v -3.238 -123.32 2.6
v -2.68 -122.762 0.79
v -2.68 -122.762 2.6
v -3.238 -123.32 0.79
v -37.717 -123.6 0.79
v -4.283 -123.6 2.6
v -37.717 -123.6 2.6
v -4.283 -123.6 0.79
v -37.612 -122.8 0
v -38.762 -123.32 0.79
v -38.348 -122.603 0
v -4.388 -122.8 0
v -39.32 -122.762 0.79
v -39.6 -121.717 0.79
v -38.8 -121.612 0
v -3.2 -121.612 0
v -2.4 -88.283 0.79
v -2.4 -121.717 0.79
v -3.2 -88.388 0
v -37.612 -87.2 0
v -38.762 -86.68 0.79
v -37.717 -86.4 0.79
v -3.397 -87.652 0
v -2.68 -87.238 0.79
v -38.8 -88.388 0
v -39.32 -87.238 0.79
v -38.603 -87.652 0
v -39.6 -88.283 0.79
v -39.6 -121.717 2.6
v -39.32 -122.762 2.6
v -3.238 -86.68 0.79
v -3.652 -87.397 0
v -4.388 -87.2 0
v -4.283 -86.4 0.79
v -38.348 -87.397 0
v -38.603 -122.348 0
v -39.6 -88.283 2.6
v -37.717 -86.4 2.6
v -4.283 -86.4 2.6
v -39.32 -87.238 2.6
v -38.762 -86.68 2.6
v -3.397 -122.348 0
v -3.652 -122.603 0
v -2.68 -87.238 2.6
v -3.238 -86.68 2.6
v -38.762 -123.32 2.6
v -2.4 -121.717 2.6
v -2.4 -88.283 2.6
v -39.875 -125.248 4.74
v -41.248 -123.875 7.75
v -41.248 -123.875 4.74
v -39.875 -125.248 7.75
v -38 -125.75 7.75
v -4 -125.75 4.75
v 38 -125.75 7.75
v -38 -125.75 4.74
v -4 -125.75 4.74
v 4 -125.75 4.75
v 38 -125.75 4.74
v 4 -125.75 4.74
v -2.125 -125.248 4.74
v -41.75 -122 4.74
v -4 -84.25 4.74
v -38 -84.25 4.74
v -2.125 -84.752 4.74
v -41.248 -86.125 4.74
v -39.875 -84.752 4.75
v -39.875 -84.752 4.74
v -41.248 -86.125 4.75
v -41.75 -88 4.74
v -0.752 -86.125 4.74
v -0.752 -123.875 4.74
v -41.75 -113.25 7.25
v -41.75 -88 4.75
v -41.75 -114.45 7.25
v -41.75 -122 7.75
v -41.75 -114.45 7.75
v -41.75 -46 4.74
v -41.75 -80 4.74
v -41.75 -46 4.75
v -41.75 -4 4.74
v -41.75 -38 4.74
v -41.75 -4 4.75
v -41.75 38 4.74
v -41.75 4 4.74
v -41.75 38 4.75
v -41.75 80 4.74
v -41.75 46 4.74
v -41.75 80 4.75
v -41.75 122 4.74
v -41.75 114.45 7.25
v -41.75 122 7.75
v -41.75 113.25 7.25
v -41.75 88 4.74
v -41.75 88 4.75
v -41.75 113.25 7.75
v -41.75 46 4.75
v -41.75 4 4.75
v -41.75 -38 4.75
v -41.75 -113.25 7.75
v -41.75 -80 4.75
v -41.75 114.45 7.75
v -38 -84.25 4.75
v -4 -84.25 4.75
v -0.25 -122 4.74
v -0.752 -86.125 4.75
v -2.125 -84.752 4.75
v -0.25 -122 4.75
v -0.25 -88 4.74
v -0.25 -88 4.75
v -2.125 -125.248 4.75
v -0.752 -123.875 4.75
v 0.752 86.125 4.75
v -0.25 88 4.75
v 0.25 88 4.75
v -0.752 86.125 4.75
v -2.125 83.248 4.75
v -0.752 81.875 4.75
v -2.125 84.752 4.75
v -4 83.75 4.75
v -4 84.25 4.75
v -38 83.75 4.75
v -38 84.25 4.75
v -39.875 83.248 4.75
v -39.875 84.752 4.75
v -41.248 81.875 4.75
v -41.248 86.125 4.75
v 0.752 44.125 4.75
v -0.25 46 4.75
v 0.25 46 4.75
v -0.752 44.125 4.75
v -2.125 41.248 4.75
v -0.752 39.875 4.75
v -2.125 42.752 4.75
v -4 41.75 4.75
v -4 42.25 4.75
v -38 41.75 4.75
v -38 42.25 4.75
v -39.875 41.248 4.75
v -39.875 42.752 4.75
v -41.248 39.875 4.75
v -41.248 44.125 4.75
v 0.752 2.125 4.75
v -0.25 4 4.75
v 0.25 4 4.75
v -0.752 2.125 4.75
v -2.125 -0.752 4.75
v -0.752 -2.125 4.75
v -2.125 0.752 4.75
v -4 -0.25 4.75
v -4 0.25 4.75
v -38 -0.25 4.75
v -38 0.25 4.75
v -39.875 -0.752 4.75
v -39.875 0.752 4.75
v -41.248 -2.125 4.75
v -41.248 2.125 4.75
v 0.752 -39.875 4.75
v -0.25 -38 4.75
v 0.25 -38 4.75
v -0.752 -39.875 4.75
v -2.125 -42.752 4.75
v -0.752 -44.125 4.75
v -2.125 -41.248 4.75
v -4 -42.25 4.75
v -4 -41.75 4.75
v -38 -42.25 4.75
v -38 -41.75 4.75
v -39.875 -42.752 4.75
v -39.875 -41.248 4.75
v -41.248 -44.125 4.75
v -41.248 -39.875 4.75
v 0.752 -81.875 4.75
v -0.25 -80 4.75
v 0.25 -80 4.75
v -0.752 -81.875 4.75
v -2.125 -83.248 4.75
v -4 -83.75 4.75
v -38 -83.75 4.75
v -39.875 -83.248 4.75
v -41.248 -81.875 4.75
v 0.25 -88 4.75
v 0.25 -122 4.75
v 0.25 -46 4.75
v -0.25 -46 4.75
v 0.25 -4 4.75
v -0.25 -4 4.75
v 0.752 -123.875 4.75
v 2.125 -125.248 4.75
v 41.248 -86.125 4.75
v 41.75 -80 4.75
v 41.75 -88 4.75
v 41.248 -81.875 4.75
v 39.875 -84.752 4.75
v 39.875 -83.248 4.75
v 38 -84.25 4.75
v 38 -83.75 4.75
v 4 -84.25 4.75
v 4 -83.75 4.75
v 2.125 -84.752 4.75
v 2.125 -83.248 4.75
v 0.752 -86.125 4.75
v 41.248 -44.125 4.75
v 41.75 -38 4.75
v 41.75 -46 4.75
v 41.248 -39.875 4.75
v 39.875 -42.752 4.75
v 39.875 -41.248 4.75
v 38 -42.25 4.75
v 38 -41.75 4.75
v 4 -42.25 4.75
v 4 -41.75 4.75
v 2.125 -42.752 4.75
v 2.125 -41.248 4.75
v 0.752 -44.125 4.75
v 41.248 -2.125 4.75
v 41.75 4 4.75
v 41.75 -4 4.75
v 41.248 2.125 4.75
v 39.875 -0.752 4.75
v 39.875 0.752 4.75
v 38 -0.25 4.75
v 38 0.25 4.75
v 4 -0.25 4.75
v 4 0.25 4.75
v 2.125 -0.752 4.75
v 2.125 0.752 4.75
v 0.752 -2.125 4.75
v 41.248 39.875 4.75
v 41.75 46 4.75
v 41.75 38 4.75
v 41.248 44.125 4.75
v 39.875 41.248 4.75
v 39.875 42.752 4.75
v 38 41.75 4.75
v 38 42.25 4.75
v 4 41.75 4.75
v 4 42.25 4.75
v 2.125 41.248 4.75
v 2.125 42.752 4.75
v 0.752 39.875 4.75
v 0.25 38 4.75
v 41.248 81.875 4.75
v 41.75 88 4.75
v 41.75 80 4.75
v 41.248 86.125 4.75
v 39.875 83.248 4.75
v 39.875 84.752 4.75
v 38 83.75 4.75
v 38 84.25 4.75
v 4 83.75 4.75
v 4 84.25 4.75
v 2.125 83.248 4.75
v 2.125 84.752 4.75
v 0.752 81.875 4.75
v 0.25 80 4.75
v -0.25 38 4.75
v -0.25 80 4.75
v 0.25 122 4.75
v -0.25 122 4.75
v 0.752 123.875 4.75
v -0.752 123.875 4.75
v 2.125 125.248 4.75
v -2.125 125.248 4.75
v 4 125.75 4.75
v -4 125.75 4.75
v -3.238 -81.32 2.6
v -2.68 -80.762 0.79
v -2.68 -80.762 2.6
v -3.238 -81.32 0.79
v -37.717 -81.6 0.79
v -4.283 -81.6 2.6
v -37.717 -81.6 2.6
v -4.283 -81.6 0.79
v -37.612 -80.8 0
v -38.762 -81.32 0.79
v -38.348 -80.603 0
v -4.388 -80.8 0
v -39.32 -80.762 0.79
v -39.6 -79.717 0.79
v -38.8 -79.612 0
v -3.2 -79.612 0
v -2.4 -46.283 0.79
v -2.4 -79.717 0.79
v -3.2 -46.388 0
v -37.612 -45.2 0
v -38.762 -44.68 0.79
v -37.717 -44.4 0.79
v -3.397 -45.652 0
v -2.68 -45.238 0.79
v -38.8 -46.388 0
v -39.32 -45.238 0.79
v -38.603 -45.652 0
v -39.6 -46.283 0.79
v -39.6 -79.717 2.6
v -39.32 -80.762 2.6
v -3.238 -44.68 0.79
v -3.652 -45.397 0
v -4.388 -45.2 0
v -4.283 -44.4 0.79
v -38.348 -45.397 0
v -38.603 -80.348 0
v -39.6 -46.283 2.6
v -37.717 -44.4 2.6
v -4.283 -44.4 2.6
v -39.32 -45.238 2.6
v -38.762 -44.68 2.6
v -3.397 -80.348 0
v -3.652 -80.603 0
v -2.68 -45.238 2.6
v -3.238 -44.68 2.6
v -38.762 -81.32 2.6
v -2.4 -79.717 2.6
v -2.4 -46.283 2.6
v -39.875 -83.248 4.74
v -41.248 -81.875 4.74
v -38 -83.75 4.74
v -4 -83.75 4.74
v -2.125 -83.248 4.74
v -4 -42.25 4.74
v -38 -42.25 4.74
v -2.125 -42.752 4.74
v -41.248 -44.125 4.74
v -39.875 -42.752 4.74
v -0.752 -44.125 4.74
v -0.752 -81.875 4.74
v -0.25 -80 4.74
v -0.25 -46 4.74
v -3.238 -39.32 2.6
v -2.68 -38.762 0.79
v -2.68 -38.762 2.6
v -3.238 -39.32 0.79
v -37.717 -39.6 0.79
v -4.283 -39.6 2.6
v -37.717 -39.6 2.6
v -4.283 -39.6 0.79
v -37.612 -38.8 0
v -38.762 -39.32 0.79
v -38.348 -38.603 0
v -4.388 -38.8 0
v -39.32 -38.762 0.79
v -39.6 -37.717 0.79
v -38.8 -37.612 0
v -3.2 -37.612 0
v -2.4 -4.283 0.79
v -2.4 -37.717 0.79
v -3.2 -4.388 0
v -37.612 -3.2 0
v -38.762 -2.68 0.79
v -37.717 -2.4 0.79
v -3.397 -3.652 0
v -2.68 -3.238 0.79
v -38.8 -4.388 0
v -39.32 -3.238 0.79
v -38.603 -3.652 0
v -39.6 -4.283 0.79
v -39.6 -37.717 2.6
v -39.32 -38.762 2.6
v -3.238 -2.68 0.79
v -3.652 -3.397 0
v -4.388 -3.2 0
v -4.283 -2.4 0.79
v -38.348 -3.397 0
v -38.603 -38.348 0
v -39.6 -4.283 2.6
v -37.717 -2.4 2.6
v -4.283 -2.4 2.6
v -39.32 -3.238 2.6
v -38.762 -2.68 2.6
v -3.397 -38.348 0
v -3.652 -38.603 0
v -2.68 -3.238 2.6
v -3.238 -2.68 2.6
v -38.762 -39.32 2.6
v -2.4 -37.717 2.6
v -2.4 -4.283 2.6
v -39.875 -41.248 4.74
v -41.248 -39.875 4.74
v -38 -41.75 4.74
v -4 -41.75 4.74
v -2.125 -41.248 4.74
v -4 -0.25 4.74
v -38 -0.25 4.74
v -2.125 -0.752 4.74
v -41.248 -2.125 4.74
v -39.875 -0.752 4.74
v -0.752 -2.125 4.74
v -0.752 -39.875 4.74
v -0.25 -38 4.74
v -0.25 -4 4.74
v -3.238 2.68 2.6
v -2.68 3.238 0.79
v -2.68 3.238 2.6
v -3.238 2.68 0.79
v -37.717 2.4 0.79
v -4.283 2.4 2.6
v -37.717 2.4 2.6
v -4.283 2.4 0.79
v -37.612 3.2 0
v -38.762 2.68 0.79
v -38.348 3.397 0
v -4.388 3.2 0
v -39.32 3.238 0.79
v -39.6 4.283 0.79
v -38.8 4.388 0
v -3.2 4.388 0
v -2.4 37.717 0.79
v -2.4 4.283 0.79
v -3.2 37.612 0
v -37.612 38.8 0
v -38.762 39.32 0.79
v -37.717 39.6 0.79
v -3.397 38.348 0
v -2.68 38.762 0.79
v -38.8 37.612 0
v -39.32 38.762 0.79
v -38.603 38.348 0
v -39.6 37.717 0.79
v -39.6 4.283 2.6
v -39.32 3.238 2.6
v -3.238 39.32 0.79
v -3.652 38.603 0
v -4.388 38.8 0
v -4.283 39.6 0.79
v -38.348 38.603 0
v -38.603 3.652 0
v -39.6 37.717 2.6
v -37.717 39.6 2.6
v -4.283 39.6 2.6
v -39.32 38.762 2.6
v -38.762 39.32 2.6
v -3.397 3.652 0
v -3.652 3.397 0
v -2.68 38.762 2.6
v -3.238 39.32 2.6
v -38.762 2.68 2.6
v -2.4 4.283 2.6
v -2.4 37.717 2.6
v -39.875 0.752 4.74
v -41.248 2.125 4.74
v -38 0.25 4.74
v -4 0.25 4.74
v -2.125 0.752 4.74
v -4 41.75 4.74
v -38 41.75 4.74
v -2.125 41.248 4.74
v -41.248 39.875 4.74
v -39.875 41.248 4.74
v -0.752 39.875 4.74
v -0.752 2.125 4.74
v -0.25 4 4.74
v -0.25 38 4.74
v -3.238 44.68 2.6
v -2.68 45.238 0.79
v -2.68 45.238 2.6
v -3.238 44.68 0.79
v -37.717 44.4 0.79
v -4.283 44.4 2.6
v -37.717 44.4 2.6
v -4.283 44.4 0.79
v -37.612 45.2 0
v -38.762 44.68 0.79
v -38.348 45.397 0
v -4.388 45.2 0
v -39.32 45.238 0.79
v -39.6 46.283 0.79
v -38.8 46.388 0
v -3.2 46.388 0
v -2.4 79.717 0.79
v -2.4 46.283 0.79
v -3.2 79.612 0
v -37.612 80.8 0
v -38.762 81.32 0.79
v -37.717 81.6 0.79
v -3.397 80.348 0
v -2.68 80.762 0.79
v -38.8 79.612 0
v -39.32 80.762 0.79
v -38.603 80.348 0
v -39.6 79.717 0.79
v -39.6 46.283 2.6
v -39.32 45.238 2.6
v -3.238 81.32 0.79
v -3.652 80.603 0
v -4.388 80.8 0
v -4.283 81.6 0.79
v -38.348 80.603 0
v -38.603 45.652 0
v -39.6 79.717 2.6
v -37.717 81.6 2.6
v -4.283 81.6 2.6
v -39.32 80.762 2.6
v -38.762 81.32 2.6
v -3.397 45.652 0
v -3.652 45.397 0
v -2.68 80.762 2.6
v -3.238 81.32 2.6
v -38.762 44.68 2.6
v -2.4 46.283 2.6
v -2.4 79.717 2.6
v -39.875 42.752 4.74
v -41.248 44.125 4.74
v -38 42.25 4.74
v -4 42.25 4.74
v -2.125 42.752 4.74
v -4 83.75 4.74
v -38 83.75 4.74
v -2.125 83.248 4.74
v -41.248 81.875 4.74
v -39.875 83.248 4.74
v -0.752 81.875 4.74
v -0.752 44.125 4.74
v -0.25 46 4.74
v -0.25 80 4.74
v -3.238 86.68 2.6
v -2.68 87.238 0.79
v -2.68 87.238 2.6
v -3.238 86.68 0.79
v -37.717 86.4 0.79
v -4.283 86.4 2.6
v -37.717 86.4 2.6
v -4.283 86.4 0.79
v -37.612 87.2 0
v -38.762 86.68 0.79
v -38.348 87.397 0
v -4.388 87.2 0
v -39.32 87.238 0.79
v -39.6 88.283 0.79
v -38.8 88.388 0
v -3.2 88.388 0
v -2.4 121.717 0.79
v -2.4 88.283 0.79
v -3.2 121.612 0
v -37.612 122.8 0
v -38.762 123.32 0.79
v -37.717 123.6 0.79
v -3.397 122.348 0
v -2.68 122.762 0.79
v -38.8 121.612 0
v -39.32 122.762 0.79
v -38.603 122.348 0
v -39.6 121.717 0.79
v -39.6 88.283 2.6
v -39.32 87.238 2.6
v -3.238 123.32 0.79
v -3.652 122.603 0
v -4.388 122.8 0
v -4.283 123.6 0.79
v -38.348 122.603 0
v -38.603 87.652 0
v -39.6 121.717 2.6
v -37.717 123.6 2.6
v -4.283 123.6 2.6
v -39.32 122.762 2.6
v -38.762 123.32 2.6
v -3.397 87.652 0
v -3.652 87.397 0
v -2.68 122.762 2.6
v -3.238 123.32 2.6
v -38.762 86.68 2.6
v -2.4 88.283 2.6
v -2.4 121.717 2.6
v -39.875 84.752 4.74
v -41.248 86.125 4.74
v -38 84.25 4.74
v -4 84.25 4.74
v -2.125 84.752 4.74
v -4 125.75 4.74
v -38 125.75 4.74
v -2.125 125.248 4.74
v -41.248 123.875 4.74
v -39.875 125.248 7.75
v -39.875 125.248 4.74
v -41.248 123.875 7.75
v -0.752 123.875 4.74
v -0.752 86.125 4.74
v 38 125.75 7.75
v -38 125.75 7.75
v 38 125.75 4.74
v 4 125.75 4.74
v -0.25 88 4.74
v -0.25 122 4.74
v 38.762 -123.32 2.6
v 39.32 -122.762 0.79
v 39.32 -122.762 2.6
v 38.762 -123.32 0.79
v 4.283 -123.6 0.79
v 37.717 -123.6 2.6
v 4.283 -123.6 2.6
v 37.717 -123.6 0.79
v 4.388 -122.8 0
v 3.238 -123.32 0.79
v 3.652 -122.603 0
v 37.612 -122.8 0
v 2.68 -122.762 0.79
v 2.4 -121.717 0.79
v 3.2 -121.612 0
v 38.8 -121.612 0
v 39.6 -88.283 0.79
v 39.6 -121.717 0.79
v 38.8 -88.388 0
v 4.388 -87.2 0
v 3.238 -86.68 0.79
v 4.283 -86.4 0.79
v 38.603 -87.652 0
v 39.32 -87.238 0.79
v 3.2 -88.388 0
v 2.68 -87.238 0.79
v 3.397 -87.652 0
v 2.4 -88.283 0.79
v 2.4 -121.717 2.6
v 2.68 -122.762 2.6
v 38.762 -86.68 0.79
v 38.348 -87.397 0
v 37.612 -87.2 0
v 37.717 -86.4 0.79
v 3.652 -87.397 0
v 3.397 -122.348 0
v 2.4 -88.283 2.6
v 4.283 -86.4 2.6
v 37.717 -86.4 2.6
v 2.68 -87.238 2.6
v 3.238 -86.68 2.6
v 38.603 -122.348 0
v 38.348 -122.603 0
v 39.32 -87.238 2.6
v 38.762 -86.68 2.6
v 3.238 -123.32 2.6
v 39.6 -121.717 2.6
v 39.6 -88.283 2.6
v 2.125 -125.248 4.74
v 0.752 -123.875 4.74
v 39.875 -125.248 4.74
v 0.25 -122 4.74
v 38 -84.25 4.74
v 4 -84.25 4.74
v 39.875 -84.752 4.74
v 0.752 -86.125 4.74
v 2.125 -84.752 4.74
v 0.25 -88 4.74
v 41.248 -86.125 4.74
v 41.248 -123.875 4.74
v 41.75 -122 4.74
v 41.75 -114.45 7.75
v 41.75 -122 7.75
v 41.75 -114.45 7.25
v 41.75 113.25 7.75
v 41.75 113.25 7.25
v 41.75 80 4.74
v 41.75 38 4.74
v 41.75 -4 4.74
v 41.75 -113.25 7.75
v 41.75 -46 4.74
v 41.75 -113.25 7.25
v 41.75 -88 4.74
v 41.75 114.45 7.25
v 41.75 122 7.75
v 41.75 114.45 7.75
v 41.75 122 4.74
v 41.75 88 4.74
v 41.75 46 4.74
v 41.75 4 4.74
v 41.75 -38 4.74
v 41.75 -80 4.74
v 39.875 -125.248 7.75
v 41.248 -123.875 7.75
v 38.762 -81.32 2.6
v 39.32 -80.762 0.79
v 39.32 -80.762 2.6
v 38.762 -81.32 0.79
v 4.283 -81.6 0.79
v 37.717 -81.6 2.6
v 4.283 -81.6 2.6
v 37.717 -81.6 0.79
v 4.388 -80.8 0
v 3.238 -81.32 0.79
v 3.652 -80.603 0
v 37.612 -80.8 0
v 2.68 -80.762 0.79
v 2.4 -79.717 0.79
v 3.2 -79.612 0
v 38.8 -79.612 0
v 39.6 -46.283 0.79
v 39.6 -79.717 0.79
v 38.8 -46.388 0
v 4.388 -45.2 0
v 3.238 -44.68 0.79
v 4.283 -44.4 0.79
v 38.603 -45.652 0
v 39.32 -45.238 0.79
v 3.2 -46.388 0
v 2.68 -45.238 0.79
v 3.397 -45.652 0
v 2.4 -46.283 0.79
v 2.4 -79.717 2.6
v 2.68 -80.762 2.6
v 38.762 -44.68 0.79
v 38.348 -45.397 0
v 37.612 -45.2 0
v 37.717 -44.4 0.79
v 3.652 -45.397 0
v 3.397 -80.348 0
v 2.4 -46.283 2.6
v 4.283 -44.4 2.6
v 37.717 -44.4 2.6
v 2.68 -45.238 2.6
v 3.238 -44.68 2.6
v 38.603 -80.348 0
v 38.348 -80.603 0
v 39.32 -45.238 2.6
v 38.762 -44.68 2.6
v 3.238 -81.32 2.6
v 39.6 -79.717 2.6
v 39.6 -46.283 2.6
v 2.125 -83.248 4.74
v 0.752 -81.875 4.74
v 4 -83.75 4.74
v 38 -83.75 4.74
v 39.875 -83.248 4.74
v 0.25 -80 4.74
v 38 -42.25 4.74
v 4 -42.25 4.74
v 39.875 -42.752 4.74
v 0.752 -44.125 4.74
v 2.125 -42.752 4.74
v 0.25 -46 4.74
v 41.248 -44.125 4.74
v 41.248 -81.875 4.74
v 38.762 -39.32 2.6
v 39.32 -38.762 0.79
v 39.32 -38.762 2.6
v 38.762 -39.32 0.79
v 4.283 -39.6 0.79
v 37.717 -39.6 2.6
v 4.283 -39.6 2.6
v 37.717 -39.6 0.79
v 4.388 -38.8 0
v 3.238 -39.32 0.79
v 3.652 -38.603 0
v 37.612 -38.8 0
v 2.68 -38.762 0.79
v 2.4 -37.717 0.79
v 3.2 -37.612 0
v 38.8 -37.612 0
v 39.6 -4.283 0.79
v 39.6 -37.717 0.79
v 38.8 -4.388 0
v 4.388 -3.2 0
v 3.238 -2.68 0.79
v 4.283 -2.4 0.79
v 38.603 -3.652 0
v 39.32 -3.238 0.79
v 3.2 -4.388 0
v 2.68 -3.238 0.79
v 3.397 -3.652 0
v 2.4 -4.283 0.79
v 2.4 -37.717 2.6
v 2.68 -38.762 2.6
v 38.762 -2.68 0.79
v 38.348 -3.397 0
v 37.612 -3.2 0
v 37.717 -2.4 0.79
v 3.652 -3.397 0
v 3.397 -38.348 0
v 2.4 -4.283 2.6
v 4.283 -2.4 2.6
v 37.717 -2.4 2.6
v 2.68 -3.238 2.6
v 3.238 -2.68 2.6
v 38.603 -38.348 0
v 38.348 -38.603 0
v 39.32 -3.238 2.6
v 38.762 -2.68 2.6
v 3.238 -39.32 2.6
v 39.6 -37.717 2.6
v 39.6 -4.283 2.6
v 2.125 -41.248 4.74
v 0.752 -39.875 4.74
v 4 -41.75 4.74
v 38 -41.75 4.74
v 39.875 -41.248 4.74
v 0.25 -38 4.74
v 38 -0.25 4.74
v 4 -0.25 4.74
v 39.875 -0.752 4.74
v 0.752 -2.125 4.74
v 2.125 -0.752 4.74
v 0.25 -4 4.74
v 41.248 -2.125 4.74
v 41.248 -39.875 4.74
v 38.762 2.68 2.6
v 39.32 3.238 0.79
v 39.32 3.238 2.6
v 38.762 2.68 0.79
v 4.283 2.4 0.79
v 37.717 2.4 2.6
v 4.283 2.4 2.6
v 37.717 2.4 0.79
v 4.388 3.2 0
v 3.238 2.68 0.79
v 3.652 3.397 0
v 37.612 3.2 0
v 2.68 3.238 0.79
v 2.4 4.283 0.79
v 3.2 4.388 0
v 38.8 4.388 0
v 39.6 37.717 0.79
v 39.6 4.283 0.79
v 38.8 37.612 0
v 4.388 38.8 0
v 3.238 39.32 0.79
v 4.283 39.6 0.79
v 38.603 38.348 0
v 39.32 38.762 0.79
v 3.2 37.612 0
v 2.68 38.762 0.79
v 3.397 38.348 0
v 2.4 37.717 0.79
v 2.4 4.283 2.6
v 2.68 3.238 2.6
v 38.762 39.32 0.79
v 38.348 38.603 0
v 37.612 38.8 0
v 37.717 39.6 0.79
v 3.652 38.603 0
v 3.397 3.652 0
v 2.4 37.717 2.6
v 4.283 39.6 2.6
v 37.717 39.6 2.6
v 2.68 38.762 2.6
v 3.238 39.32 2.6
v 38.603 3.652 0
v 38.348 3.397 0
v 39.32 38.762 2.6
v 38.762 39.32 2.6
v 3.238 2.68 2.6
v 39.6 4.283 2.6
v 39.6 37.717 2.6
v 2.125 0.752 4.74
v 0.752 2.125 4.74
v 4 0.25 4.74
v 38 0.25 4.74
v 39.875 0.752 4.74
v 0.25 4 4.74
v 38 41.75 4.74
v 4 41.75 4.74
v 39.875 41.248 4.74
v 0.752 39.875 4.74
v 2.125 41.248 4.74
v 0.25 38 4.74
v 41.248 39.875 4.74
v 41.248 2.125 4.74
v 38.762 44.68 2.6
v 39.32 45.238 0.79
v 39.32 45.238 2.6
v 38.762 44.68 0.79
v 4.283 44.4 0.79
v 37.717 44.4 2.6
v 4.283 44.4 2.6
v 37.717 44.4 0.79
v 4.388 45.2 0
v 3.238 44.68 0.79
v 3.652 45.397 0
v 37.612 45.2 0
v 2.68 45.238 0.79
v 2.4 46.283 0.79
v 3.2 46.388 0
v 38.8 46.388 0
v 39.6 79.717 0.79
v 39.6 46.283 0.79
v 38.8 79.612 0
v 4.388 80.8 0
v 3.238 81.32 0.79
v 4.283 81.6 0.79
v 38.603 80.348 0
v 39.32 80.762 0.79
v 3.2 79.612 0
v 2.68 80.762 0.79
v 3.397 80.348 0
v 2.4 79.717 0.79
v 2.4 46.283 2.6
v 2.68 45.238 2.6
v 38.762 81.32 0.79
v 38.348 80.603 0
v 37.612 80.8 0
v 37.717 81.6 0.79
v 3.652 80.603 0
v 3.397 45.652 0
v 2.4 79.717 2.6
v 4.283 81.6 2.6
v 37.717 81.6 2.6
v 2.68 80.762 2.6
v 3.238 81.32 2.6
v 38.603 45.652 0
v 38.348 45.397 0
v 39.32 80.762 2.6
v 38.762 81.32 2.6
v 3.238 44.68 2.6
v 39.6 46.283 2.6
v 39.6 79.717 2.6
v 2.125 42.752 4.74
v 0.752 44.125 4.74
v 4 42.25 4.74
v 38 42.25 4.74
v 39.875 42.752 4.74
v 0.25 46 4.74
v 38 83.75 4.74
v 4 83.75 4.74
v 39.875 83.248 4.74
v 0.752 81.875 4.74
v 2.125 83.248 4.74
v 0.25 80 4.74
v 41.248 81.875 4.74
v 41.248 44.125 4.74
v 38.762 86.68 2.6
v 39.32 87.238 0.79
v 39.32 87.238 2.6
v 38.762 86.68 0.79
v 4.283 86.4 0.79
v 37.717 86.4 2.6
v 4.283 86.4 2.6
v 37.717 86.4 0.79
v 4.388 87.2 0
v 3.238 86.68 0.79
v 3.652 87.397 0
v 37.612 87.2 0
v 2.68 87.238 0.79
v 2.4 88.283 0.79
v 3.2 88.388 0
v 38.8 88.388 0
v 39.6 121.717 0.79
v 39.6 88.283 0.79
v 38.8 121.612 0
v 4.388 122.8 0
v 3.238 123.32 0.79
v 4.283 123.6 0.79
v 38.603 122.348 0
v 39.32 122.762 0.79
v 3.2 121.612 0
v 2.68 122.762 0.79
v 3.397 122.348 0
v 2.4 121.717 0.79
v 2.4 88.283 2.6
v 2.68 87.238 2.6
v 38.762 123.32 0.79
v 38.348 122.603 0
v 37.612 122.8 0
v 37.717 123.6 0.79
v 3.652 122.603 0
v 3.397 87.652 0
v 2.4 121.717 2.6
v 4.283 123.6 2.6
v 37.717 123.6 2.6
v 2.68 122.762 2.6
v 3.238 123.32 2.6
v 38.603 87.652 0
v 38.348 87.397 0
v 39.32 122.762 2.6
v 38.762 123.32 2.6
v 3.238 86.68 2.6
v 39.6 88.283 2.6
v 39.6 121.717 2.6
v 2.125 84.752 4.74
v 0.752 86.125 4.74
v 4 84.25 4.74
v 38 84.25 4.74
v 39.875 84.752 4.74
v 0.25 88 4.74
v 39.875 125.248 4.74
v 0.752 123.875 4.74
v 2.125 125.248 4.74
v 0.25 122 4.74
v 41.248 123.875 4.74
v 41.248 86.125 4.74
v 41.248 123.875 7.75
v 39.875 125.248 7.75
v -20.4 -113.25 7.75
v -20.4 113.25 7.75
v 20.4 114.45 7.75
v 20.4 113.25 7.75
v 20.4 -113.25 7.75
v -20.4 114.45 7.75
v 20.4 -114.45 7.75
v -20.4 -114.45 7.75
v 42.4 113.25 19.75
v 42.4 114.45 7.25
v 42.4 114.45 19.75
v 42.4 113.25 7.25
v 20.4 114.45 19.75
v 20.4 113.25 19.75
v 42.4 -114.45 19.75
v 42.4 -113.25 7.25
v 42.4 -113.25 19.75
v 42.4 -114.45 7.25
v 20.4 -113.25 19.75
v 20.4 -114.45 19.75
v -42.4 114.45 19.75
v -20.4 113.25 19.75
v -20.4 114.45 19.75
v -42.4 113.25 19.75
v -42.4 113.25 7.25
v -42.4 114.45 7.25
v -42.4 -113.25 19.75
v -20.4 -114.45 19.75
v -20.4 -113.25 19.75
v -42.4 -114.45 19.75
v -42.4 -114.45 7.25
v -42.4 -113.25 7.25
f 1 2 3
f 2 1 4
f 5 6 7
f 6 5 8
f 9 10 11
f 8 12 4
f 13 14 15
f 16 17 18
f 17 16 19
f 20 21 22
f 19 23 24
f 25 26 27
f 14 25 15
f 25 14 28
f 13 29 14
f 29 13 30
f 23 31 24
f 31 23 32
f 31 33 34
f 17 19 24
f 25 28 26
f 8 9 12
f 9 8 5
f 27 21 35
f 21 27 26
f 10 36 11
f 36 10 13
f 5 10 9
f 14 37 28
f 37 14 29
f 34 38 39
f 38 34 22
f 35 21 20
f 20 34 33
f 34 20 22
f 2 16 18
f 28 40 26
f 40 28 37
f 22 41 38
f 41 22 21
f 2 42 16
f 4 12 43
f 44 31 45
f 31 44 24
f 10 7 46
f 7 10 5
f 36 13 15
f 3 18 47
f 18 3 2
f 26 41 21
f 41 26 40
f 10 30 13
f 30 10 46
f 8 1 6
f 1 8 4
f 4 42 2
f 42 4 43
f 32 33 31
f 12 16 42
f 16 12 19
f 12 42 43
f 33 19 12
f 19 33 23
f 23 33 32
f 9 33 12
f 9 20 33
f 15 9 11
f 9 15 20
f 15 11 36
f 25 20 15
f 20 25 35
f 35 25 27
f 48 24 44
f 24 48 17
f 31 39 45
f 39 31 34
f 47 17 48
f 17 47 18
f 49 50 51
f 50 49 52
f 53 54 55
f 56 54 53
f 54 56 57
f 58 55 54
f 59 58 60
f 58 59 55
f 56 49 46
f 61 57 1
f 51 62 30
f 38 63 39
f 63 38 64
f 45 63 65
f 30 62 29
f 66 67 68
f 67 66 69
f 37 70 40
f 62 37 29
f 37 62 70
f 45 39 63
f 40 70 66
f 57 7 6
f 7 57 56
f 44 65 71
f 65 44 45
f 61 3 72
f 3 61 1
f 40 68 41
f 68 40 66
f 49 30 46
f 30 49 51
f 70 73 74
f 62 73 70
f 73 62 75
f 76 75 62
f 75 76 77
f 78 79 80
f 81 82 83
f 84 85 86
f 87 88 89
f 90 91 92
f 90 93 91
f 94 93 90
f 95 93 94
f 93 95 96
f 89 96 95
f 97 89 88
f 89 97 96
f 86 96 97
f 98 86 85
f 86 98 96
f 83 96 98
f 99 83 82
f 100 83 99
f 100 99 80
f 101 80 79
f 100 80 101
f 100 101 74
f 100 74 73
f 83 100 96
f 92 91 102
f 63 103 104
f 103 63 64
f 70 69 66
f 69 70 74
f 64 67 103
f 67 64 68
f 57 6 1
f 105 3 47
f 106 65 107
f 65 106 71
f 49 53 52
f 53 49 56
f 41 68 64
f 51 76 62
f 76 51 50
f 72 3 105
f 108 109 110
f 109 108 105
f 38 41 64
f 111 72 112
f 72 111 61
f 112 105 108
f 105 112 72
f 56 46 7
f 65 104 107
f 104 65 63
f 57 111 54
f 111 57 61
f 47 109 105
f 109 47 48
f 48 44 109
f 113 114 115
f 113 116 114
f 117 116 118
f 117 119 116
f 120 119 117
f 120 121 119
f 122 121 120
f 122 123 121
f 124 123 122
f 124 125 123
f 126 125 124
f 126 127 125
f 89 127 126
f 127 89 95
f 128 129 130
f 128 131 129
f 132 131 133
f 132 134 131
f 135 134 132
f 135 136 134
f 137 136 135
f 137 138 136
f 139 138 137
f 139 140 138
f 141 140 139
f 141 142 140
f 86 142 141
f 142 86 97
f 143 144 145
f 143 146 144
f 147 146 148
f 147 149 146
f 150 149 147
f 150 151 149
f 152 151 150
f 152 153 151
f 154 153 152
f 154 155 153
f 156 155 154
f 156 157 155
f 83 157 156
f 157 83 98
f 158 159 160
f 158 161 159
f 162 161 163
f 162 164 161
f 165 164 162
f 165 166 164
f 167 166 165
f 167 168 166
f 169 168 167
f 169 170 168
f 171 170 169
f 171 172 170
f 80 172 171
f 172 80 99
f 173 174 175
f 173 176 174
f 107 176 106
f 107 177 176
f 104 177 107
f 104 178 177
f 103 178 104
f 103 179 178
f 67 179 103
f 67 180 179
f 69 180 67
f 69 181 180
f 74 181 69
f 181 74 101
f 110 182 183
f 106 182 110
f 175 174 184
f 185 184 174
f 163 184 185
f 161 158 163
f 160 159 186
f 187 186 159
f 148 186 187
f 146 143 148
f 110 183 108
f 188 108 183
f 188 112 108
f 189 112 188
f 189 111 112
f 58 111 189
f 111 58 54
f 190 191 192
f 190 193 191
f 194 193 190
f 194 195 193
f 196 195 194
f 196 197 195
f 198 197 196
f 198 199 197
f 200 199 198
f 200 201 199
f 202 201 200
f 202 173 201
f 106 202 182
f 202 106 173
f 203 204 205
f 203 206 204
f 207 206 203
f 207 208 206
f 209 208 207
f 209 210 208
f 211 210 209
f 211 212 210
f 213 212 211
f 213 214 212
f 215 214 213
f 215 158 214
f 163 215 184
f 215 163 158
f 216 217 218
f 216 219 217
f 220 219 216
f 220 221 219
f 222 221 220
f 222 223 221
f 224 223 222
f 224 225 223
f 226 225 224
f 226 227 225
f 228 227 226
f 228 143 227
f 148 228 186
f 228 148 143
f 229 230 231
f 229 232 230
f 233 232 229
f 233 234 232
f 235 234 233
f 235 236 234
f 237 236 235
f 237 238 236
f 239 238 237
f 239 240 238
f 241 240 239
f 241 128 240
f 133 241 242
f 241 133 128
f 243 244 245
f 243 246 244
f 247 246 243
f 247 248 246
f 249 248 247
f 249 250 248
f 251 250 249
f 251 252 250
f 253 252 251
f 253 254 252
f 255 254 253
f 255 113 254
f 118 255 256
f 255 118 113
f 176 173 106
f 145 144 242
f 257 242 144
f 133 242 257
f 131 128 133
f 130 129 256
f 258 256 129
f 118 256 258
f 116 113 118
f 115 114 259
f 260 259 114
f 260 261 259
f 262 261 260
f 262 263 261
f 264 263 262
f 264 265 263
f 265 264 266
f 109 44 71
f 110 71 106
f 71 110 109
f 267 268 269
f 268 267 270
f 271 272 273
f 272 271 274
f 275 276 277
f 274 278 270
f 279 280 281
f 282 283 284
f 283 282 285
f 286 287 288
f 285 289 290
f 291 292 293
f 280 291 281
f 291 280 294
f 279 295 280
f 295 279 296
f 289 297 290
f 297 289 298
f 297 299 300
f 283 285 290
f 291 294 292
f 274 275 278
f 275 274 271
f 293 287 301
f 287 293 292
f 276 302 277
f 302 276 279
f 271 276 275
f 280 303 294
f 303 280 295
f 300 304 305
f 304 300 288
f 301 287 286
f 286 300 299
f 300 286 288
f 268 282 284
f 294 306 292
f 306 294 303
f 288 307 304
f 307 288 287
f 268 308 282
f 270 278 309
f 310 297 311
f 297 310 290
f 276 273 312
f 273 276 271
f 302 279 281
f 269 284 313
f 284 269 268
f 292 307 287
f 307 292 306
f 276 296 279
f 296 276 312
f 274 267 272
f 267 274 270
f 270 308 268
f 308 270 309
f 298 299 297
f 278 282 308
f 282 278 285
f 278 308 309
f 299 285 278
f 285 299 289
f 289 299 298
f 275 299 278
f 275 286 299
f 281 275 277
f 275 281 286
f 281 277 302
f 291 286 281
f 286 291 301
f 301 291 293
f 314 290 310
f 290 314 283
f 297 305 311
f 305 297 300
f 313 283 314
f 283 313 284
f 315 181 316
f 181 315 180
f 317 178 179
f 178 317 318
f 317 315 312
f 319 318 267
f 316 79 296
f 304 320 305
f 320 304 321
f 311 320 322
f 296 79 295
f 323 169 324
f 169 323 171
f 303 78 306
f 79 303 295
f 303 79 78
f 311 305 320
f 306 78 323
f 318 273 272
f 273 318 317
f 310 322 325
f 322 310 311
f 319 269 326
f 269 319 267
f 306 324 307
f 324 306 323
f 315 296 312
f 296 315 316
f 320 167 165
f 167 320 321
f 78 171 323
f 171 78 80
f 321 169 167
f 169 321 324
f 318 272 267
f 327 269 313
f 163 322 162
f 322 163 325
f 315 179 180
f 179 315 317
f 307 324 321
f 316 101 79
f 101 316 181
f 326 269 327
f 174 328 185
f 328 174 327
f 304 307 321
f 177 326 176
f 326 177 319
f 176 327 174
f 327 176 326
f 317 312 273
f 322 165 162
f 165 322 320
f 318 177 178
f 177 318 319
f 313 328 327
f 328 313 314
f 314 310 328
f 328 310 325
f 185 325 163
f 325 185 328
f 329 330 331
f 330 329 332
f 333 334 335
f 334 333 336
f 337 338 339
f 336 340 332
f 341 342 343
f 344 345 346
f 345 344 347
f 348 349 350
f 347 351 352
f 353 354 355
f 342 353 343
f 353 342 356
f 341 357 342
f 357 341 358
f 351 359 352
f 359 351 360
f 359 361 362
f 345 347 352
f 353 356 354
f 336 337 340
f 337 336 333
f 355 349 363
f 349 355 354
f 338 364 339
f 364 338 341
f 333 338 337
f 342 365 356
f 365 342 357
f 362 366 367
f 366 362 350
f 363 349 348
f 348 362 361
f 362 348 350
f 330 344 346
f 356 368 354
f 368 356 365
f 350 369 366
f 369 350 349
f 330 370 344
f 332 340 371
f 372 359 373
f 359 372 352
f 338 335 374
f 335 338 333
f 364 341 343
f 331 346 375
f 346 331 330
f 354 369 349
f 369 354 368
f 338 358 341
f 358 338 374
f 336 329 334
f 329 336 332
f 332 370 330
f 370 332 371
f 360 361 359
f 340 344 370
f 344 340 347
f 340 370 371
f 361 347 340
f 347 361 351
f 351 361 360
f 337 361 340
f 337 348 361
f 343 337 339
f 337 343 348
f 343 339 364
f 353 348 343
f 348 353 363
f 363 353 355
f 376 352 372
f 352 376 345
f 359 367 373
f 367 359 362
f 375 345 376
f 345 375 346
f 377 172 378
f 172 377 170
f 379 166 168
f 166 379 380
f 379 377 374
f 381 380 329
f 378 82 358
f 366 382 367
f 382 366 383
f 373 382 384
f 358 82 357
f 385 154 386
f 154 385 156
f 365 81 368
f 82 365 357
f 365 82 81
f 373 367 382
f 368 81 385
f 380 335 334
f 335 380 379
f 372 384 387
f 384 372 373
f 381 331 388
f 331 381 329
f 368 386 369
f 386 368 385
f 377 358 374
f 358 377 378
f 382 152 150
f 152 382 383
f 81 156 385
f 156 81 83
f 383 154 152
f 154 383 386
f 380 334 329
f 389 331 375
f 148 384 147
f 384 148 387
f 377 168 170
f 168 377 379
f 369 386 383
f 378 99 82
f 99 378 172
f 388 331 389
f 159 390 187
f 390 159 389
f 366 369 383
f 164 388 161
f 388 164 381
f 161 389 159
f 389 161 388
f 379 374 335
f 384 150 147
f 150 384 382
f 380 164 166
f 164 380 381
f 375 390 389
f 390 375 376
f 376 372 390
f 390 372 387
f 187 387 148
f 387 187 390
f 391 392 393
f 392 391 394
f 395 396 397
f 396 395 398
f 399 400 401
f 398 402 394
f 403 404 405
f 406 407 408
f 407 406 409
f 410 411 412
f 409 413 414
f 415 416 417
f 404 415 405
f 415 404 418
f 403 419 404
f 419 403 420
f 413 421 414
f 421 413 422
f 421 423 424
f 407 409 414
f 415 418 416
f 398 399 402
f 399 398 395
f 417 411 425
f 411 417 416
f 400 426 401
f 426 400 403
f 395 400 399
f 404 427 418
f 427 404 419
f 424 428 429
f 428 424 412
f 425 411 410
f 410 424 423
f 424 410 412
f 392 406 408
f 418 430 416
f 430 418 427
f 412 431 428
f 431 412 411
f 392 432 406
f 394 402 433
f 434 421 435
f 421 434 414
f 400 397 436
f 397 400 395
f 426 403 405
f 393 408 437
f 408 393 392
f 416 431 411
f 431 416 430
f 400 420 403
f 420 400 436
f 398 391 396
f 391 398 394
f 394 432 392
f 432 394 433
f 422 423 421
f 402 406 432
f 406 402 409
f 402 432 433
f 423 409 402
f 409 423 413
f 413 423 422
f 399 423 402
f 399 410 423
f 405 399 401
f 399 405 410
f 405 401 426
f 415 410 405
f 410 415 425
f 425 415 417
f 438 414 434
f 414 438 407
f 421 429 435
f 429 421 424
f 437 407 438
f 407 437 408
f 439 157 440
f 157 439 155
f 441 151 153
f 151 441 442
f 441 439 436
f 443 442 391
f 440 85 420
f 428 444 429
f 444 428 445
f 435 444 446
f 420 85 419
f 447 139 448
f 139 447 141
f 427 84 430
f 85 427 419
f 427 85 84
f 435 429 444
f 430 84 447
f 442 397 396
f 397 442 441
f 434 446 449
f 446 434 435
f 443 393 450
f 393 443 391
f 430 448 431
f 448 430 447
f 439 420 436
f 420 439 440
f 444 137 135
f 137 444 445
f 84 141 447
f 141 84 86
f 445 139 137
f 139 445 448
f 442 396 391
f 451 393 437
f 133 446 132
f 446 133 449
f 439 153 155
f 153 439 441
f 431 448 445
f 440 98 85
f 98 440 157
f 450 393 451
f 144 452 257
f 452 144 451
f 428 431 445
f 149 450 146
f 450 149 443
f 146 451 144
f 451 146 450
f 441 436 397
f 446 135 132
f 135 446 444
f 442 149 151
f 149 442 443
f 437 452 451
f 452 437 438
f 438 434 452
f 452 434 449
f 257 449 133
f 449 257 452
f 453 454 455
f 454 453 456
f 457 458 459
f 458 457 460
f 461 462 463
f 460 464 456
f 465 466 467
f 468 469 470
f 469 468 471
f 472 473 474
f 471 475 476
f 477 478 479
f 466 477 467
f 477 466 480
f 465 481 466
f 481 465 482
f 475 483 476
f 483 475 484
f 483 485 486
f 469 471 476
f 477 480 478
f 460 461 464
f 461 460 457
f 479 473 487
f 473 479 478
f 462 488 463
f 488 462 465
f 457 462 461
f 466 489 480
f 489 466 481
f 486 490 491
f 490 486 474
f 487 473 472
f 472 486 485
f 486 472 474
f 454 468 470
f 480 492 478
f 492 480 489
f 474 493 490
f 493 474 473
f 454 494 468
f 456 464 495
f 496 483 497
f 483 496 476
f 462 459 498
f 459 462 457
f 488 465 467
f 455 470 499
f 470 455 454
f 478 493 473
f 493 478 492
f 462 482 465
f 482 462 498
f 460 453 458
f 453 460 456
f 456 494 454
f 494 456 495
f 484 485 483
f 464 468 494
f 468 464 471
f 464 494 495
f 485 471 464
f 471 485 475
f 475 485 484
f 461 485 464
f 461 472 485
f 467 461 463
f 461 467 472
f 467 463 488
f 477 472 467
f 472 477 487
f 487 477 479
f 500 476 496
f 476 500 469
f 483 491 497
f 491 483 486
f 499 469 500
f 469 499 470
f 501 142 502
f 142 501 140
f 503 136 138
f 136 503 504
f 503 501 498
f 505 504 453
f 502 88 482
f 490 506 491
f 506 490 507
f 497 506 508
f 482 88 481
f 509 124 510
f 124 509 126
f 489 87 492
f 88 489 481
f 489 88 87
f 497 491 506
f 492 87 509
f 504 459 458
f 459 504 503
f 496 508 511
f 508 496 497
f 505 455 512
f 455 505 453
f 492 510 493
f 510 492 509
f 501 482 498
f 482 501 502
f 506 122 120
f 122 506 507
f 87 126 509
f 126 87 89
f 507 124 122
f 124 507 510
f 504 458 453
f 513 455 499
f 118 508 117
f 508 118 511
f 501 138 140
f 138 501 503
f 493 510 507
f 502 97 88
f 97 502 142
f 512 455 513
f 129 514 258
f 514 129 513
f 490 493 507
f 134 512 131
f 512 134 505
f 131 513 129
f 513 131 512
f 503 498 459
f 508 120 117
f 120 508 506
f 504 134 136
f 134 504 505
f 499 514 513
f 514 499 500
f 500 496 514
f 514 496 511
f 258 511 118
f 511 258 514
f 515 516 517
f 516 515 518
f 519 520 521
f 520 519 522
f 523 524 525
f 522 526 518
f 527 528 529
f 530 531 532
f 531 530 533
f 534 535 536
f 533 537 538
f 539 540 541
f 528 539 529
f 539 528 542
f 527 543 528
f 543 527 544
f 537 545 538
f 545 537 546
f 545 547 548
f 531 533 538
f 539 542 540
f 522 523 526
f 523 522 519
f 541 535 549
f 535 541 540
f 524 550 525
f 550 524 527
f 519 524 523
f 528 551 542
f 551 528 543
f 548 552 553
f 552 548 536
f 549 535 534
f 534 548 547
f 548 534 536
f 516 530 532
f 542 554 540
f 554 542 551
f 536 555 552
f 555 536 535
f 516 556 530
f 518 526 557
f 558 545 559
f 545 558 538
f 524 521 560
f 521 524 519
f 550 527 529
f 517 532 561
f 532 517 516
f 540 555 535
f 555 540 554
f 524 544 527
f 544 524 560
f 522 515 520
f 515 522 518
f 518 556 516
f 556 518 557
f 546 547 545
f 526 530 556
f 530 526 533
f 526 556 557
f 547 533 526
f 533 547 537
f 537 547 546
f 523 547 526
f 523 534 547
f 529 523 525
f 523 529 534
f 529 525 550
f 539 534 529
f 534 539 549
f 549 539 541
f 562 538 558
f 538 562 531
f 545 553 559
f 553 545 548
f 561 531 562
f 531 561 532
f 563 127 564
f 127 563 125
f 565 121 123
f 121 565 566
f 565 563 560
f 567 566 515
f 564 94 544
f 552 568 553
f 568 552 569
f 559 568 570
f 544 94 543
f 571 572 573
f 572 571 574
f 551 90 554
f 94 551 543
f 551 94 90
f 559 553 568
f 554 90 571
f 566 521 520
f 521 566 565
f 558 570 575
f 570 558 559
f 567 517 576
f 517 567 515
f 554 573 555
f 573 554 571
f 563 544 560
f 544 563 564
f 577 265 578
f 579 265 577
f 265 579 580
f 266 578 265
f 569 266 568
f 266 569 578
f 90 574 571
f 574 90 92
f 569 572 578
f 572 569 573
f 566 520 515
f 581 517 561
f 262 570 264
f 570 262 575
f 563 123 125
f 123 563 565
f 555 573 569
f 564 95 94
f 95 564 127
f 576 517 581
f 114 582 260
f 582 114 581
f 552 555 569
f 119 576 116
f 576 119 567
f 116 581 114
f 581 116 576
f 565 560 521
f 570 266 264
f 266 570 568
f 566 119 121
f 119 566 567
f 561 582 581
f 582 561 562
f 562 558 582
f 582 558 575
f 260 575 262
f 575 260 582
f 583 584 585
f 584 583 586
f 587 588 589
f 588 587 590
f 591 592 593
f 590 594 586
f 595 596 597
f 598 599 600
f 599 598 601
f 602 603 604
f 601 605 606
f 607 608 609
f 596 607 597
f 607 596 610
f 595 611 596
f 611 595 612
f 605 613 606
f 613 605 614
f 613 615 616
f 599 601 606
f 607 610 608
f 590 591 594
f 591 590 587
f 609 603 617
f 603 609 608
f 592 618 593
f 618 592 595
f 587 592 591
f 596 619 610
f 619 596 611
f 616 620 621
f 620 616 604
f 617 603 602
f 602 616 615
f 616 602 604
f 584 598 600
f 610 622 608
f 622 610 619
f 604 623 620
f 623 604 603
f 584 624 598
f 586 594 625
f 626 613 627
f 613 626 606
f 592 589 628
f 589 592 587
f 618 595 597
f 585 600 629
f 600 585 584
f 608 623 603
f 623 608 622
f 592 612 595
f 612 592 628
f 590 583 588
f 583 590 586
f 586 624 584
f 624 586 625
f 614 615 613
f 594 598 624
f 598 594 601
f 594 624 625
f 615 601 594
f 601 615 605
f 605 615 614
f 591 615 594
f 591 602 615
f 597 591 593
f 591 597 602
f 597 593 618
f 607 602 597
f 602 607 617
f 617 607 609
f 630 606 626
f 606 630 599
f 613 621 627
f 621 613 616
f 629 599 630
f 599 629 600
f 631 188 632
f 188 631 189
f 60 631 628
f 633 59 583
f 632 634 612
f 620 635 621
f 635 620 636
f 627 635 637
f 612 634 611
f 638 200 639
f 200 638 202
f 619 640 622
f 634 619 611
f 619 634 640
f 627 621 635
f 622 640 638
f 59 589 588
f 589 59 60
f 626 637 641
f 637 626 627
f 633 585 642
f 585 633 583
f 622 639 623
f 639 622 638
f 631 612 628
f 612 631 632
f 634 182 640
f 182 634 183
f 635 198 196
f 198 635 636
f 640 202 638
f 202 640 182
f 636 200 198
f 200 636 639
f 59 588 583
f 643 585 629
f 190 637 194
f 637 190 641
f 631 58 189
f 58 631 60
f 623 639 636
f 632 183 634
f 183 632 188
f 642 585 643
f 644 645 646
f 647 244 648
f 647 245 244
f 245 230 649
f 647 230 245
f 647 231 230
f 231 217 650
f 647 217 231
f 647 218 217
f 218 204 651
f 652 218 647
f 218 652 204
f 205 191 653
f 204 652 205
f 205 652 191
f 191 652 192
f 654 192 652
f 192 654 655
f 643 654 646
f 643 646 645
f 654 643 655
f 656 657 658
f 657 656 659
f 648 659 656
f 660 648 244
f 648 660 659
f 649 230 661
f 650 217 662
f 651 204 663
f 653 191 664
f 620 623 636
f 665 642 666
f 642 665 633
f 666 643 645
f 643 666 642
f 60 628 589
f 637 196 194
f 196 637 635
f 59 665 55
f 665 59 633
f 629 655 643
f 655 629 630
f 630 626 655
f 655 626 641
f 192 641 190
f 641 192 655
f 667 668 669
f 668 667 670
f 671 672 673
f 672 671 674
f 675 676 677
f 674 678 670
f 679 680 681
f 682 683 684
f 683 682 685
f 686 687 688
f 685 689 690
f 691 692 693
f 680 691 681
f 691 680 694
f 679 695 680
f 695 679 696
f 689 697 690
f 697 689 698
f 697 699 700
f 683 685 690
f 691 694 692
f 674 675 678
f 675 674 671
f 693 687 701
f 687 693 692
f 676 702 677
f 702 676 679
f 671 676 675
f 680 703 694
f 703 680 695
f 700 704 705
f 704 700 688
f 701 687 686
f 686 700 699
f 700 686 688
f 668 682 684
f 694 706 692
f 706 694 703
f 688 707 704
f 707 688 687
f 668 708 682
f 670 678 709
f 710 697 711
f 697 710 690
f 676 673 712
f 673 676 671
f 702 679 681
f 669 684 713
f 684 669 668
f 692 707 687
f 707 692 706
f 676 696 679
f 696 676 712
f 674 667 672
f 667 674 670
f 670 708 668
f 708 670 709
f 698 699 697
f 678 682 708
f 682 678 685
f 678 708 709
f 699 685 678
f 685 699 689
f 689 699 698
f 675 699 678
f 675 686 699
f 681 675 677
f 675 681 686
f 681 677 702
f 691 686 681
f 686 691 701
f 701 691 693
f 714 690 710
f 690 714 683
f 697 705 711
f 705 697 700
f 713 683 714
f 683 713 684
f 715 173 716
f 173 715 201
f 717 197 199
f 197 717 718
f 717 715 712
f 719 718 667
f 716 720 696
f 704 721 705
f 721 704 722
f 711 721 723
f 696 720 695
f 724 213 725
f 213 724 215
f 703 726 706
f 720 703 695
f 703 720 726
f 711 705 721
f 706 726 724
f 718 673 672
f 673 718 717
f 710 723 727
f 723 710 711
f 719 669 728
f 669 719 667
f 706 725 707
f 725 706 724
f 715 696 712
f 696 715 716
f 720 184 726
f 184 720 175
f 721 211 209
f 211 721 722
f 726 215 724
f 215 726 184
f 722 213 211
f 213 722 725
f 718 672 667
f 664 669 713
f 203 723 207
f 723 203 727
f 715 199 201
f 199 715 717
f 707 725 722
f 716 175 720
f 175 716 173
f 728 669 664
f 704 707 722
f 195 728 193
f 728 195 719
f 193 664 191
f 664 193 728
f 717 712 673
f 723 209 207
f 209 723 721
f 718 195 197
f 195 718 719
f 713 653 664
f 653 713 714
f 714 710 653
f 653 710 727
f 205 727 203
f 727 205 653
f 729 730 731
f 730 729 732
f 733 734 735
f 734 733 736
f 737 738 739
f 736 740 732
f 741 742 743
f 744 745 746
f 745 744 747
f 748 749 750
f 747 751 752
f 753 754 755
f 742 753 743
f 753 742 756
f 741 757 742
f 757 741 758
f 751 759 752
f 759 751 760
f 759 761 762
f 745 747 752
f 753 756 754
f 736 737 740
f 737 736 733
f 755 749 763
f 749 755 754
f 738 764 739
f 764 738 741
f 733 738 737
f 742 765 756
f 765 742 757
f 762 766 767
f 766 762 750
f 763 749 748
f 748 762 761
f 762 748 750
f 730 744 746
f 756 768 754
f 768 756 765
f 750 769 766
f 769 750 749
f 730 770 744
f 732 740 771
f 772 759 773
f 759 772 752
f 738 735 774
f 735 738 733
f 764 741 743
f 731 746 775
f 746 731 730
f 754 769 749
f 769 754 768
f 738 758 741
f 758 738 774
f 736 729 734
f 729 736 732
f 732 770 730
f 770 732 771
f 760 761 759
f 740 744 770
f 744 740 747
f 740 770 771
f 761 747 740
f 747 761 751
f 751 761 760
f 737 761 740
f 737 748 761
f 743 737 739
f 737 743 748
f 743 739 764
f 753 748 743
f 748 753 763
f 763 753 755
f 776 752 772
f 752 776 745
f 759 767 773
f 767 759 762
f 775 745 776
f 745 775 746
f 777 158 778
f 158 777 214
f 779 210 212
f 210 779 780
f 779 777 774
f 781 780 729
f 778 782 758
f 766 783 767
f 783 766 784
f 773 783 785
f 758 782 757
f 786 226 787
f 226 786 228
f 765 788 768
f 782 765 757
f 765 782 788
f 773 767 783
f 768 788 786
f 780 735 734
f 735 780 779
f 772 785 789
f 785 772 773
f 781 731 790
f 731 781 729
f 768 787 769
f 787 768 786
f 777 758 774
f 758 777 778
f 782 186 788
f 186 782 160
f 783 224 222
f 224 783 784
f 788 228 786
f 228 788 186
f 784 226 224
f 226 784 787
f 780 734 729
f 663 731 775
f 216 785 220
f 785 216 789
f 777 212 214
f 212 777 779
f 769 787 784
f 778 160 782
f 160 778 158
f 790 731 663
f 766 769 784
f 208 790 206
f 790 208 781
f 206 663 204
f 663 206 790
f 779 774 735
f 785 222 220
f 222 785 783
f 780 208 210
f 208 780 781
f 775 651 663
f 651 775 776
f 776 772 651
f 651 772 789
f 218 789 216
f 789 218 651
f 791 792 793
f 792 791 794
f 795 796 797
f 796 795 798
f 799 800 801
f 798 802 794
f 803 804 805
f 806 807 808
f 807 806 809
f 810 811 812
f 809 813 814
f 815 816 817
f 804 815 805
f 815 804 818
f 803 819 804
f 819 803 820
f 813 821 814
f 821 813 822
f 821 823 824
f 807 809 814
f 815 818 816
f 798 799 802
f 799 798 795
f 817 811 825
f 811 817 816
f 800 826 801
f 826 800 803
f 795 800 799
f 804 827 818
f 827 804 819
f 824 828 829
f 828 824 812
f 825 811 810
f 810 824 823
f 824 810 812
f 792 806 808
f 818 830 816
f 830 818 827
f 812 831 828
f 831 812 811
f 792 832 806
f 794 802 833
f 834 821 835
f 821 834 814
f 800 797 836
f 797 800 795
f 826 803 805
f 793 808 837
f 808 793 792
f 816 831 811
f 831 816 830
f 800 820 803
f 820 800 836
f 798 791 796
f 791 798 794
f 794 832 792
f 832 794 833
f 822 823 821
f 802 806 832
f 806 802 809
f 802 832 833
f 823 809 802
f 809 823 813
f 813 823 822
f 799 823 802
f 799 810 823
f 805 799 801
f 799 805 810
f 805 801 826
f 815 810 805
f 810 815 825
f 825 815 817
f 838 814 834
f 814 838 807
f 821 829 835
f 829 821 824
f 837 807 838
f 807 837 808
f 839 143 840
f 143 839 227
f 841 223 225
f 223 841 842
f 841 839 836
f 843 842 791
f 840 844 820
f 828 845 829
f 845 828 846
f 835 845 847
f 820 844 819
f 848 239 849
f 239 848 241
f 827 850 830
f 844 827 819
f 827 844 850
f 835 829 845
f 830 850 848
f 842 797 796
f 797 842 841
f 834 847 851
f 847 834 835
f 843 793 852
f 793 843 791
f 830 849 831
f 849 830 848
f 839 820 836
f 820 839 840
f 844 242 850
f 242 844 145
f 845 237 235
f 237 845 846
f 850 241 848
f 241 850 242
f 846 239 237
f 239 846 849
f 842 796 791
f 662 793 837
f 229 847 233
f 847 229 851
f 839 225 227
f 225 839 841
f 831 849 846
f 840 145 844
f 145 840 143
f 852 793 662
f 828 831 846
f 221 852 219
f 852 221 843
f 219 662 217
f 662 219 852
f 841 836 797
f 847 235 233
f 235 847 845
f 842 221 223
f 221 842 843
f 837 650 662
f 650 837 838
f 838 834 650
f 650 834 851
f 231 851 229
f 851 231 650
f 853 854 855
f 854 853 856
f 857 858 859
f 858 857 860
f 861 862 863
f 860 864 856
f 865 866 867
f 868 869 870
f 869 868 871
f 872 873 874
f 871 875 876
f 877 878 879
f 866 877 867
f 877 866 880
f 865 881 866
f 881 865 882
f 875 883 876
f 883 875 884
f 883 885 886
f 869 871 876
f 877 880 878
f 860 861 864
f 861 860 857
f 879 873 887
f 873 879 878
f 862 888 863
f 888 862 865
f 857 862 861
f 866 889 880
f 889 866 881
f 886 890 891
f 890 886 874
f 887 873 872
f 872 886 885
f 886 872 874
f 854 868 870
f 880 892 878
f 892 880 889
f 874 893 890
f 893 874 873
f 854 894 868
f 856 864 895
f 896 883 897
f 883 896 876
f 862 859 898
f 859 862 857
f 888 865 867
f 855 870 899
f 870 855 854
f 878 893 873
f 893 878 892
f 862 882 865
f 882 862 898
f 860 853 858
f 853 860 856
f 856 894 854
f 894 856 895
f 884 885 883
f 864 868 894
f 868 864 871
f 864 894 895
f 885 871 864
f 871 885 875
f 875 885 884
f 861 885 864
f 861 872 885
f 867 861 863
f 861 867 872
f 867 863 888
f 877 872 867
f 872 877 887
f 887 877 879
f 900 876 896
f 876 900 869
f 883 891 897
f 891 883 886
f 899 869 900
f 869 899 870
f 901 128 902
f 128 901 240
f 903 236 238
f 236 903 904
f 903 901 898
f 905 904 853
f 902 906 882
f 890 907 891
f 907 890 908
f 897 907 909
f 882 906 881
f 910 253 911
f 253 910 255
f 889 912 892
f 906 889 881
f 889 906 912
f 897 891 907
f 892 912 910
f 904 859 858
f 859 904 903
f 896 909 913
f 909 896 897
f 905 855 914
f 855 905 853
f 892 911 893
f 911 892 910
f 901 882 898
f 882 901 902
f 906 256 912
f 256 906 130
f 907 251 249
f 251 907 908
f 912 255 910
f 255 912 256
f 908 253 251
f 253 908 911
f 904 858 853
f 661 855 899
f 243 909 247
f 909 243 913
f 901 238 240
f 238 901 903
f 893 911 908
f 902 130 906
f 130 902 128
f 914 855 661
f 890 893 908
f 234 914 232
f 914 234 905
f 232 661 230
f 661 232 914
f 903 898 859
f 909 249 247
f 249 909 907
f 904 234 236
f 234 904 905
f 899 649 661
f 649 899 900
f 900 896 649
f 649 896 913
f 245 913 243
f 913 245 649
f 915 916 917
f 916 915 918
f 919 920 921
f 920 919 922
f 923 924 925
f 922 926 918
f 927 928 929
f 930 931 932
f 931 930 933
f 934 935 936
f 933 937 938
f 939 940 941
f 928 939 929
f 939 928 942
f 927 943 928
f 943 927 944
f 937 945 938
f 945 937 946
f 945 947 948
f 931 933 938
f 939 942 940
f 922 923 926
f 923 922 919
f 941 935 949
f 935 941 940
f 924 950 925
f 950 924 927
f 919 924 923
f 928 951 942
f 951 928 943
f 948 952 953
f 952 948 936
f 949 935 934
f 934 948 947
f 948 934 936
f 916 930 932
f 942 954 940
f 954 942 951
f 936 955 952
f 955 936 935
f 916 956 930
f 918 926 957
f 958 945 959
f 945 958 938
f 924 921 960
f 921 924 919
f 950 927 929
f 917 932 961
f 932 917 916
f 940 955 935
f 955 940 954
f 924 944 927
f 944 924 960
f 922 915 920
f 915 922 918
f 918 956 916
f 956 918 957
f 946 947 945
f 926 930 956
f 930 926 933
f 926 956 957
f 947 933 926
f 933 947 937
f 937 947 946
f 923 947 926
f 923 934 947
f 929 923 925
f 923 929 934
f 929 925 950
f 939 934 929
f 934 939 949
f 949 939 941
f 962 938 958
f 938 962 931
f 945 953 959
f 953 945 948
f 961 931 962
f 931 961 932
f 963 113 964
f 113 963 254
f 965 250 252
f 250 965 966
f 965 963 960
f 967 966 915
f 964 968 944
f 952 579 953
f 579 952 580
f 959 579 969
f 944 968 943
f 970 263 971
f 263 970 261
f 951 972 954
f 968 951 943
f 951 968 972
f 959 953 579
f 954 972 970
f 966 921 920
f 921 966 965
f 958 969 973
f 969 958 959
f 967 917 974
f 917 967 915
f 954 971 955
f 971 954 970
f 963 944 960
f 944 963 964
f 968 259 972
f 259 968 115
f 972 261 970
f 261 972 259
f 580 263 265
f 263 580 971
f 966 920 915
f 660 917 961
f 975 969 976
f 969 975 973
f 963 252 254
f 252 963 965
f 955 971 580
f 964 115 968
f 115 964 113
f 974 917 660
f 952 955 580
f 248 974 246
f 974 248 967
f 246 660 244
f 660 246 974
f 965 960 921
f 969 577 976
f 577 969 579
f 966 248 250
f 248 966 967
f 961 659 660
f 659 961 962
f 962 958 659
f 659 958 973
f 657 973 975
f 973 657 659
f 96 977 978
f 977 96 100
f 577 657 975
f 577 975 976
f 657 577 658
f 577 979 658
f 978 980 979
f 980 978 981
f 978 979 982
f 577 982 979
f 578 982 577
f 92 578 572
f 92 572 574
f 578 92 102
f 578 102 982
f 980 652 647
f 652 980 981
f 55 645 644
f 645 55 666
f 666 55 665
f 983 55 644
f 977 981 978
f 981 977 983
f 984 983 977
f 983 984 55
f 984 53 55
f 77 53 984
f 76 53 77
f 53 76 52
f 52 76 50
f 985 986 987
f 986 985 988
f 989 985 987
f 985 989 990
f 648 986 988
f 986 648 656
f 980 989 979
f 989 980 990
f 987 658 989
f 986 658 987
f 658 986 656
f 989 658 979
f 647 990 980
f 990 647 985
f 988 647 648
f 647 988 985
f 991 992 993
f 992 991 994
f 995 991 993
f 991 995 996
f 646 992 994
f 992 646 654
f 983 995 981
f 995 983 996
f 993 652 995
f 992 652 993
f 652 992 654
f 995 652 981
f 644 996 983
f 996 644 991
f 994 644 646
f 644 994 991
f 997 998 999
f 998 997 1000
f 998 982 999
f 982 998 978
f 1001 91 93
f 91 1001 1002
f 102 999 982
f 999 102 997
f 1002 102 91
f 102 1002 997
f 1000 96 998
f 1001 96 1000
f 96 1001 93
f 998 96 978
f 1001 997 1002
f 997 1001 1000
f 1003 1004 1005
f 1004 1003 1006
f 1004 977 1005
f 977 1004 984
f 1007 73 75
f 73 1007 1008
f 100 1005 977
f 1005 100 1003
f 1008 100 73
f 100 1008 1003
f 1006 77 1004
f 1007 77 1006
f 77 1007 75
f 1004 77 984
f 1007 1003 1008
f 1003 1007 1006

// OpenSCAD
// file: psu_locators_common.scad
// psu_locators_common — open corner locators that give each bench supply a fixed
// home on the Clickfinity grid without blocking airflow. A shallow Gridfinity-
// footed floor plate (clicks into the bench baseplate) with LOW corner nubs that
// capture the PSU footprint. No side/front/rear walls — both supplies vent from
// the sides (ENGINDOT: FULL-height both sides; OWON: low side slots + rear fan),
// so anything enclosing would choke them. Nubs only appear on an axis where
// there's clearance between the PSU edge and the plate edge.
//
// Dimensions reused from the existing top-tray models (NOT re-measured):
//   OWON SPM8104   84.30 W × 226 D   (owon_tray_common: lid 84.30, ~226 long)
//   ENGINDOT       80    W × 193 D   (shortkiller_common: measured 80 × 193)
include <../lib/gridfinity.scad>

NUB_T   = 1.2;   // corner-nub wall thickness (thin — only room on a narrow gap)
NUB_LEN = 22;    // how far the nub runs along each captured edge
NUB_H   = 12;    // nub height — low, well clear of any vents
CLR     = 0.5;   // slip clearance so the PSU drops between the nubs
FLOOR   = 3;     // floor plate thickness above the Gridfinity foot

// One corner's nubs, inner corner at origin, opening toward −x,−y. `xw`/`yw`
// switch each wall on only when the plate has room for it on that axis.
// WHEN BOTH WALLS EXIST THEY MUST OVERLAP, NOT MEET AT A POINT.
//
// Written as two cubes butted at the origin they touch along a single EDGE, and
// that edge ends up shared by four triangles — non-manifold. It only shows on
// locators where both walls are generated: the ENGINDOT has 1.50 mm of X margin
// against NUB_T 1.2 so it gets both and produced 4 bad edges, while the OWON has
// -0.65 and gets end walls only, so it rendered clean and hid the bug.
//
// Running the side wall up through the corner by NUB_T makes it a real L with
// volumetric overlap.
// The nubs also SINK into the plate rather than butting onto its top face. A nub
// standing exactly on z0 is a partial-area join at an exact plane, which leaves
// non-manifold edges along the nub's footprint — 2 of them survived the L fix
// above until the nubs were sunk. Exact-plane butting is for FULL-face joins.
NUB_SINK = 0.5;
module _corner(xw, yw) {
    if (xw) translate([0, -NUB_LEN, -NUB_SINK])
        cube([NUB_T, NUB_LEN + (yw ? NUB_T : 0), NUB_H + NUB_SINK]);   // side wall
    if (yw) translate([-NUB_LEN, 0, -NUB_SINK])
        cube([NUB_LEN, NUB_T, NUB_H + NUB_SINK]);                       // end wall
}

// Footed floor plate + up to 4 corner nubs sized to a pw × pd PSU footprint.
module psu_locator(nx, ny, pw, pd) {
    W = nx*GF - 0.5; D = ny*GF - 0.5;
    hx = (pw + CLR)/2; hy = (pd + CLR)/2;
    xw = (W/2 - hx) >= NUB_T;   // room for a side (x-blocking) wall?
    yw = (D/2 - hy) >= NUB_T;   // room for an end (y-blocking) wall?
    z0 = BIN_BASE_H + FLOOR;
    union() {
        bin_blank(nx, ny, z0);   // shallow Gridfinity-footed floor
        for (mx = [0,1]) for (my = [0,1])
            translate([(mx?-1:1)*hx, (my?-1:1)*hy, z0])
                mirror([mx,0,0]) mirror([0,my,0]) _corner(xw, yw);
    }
}
// main file
// owon_locator — OWON SPM8104 corner locator (84.3 × 226). 2×6 footprint.
// Width ≈ 2 cells flush, so nubs land on the front/rear only; sides stay open.
include <psu_locators_common.scad>
psu_locator(2, 6, 84.3, 226);
